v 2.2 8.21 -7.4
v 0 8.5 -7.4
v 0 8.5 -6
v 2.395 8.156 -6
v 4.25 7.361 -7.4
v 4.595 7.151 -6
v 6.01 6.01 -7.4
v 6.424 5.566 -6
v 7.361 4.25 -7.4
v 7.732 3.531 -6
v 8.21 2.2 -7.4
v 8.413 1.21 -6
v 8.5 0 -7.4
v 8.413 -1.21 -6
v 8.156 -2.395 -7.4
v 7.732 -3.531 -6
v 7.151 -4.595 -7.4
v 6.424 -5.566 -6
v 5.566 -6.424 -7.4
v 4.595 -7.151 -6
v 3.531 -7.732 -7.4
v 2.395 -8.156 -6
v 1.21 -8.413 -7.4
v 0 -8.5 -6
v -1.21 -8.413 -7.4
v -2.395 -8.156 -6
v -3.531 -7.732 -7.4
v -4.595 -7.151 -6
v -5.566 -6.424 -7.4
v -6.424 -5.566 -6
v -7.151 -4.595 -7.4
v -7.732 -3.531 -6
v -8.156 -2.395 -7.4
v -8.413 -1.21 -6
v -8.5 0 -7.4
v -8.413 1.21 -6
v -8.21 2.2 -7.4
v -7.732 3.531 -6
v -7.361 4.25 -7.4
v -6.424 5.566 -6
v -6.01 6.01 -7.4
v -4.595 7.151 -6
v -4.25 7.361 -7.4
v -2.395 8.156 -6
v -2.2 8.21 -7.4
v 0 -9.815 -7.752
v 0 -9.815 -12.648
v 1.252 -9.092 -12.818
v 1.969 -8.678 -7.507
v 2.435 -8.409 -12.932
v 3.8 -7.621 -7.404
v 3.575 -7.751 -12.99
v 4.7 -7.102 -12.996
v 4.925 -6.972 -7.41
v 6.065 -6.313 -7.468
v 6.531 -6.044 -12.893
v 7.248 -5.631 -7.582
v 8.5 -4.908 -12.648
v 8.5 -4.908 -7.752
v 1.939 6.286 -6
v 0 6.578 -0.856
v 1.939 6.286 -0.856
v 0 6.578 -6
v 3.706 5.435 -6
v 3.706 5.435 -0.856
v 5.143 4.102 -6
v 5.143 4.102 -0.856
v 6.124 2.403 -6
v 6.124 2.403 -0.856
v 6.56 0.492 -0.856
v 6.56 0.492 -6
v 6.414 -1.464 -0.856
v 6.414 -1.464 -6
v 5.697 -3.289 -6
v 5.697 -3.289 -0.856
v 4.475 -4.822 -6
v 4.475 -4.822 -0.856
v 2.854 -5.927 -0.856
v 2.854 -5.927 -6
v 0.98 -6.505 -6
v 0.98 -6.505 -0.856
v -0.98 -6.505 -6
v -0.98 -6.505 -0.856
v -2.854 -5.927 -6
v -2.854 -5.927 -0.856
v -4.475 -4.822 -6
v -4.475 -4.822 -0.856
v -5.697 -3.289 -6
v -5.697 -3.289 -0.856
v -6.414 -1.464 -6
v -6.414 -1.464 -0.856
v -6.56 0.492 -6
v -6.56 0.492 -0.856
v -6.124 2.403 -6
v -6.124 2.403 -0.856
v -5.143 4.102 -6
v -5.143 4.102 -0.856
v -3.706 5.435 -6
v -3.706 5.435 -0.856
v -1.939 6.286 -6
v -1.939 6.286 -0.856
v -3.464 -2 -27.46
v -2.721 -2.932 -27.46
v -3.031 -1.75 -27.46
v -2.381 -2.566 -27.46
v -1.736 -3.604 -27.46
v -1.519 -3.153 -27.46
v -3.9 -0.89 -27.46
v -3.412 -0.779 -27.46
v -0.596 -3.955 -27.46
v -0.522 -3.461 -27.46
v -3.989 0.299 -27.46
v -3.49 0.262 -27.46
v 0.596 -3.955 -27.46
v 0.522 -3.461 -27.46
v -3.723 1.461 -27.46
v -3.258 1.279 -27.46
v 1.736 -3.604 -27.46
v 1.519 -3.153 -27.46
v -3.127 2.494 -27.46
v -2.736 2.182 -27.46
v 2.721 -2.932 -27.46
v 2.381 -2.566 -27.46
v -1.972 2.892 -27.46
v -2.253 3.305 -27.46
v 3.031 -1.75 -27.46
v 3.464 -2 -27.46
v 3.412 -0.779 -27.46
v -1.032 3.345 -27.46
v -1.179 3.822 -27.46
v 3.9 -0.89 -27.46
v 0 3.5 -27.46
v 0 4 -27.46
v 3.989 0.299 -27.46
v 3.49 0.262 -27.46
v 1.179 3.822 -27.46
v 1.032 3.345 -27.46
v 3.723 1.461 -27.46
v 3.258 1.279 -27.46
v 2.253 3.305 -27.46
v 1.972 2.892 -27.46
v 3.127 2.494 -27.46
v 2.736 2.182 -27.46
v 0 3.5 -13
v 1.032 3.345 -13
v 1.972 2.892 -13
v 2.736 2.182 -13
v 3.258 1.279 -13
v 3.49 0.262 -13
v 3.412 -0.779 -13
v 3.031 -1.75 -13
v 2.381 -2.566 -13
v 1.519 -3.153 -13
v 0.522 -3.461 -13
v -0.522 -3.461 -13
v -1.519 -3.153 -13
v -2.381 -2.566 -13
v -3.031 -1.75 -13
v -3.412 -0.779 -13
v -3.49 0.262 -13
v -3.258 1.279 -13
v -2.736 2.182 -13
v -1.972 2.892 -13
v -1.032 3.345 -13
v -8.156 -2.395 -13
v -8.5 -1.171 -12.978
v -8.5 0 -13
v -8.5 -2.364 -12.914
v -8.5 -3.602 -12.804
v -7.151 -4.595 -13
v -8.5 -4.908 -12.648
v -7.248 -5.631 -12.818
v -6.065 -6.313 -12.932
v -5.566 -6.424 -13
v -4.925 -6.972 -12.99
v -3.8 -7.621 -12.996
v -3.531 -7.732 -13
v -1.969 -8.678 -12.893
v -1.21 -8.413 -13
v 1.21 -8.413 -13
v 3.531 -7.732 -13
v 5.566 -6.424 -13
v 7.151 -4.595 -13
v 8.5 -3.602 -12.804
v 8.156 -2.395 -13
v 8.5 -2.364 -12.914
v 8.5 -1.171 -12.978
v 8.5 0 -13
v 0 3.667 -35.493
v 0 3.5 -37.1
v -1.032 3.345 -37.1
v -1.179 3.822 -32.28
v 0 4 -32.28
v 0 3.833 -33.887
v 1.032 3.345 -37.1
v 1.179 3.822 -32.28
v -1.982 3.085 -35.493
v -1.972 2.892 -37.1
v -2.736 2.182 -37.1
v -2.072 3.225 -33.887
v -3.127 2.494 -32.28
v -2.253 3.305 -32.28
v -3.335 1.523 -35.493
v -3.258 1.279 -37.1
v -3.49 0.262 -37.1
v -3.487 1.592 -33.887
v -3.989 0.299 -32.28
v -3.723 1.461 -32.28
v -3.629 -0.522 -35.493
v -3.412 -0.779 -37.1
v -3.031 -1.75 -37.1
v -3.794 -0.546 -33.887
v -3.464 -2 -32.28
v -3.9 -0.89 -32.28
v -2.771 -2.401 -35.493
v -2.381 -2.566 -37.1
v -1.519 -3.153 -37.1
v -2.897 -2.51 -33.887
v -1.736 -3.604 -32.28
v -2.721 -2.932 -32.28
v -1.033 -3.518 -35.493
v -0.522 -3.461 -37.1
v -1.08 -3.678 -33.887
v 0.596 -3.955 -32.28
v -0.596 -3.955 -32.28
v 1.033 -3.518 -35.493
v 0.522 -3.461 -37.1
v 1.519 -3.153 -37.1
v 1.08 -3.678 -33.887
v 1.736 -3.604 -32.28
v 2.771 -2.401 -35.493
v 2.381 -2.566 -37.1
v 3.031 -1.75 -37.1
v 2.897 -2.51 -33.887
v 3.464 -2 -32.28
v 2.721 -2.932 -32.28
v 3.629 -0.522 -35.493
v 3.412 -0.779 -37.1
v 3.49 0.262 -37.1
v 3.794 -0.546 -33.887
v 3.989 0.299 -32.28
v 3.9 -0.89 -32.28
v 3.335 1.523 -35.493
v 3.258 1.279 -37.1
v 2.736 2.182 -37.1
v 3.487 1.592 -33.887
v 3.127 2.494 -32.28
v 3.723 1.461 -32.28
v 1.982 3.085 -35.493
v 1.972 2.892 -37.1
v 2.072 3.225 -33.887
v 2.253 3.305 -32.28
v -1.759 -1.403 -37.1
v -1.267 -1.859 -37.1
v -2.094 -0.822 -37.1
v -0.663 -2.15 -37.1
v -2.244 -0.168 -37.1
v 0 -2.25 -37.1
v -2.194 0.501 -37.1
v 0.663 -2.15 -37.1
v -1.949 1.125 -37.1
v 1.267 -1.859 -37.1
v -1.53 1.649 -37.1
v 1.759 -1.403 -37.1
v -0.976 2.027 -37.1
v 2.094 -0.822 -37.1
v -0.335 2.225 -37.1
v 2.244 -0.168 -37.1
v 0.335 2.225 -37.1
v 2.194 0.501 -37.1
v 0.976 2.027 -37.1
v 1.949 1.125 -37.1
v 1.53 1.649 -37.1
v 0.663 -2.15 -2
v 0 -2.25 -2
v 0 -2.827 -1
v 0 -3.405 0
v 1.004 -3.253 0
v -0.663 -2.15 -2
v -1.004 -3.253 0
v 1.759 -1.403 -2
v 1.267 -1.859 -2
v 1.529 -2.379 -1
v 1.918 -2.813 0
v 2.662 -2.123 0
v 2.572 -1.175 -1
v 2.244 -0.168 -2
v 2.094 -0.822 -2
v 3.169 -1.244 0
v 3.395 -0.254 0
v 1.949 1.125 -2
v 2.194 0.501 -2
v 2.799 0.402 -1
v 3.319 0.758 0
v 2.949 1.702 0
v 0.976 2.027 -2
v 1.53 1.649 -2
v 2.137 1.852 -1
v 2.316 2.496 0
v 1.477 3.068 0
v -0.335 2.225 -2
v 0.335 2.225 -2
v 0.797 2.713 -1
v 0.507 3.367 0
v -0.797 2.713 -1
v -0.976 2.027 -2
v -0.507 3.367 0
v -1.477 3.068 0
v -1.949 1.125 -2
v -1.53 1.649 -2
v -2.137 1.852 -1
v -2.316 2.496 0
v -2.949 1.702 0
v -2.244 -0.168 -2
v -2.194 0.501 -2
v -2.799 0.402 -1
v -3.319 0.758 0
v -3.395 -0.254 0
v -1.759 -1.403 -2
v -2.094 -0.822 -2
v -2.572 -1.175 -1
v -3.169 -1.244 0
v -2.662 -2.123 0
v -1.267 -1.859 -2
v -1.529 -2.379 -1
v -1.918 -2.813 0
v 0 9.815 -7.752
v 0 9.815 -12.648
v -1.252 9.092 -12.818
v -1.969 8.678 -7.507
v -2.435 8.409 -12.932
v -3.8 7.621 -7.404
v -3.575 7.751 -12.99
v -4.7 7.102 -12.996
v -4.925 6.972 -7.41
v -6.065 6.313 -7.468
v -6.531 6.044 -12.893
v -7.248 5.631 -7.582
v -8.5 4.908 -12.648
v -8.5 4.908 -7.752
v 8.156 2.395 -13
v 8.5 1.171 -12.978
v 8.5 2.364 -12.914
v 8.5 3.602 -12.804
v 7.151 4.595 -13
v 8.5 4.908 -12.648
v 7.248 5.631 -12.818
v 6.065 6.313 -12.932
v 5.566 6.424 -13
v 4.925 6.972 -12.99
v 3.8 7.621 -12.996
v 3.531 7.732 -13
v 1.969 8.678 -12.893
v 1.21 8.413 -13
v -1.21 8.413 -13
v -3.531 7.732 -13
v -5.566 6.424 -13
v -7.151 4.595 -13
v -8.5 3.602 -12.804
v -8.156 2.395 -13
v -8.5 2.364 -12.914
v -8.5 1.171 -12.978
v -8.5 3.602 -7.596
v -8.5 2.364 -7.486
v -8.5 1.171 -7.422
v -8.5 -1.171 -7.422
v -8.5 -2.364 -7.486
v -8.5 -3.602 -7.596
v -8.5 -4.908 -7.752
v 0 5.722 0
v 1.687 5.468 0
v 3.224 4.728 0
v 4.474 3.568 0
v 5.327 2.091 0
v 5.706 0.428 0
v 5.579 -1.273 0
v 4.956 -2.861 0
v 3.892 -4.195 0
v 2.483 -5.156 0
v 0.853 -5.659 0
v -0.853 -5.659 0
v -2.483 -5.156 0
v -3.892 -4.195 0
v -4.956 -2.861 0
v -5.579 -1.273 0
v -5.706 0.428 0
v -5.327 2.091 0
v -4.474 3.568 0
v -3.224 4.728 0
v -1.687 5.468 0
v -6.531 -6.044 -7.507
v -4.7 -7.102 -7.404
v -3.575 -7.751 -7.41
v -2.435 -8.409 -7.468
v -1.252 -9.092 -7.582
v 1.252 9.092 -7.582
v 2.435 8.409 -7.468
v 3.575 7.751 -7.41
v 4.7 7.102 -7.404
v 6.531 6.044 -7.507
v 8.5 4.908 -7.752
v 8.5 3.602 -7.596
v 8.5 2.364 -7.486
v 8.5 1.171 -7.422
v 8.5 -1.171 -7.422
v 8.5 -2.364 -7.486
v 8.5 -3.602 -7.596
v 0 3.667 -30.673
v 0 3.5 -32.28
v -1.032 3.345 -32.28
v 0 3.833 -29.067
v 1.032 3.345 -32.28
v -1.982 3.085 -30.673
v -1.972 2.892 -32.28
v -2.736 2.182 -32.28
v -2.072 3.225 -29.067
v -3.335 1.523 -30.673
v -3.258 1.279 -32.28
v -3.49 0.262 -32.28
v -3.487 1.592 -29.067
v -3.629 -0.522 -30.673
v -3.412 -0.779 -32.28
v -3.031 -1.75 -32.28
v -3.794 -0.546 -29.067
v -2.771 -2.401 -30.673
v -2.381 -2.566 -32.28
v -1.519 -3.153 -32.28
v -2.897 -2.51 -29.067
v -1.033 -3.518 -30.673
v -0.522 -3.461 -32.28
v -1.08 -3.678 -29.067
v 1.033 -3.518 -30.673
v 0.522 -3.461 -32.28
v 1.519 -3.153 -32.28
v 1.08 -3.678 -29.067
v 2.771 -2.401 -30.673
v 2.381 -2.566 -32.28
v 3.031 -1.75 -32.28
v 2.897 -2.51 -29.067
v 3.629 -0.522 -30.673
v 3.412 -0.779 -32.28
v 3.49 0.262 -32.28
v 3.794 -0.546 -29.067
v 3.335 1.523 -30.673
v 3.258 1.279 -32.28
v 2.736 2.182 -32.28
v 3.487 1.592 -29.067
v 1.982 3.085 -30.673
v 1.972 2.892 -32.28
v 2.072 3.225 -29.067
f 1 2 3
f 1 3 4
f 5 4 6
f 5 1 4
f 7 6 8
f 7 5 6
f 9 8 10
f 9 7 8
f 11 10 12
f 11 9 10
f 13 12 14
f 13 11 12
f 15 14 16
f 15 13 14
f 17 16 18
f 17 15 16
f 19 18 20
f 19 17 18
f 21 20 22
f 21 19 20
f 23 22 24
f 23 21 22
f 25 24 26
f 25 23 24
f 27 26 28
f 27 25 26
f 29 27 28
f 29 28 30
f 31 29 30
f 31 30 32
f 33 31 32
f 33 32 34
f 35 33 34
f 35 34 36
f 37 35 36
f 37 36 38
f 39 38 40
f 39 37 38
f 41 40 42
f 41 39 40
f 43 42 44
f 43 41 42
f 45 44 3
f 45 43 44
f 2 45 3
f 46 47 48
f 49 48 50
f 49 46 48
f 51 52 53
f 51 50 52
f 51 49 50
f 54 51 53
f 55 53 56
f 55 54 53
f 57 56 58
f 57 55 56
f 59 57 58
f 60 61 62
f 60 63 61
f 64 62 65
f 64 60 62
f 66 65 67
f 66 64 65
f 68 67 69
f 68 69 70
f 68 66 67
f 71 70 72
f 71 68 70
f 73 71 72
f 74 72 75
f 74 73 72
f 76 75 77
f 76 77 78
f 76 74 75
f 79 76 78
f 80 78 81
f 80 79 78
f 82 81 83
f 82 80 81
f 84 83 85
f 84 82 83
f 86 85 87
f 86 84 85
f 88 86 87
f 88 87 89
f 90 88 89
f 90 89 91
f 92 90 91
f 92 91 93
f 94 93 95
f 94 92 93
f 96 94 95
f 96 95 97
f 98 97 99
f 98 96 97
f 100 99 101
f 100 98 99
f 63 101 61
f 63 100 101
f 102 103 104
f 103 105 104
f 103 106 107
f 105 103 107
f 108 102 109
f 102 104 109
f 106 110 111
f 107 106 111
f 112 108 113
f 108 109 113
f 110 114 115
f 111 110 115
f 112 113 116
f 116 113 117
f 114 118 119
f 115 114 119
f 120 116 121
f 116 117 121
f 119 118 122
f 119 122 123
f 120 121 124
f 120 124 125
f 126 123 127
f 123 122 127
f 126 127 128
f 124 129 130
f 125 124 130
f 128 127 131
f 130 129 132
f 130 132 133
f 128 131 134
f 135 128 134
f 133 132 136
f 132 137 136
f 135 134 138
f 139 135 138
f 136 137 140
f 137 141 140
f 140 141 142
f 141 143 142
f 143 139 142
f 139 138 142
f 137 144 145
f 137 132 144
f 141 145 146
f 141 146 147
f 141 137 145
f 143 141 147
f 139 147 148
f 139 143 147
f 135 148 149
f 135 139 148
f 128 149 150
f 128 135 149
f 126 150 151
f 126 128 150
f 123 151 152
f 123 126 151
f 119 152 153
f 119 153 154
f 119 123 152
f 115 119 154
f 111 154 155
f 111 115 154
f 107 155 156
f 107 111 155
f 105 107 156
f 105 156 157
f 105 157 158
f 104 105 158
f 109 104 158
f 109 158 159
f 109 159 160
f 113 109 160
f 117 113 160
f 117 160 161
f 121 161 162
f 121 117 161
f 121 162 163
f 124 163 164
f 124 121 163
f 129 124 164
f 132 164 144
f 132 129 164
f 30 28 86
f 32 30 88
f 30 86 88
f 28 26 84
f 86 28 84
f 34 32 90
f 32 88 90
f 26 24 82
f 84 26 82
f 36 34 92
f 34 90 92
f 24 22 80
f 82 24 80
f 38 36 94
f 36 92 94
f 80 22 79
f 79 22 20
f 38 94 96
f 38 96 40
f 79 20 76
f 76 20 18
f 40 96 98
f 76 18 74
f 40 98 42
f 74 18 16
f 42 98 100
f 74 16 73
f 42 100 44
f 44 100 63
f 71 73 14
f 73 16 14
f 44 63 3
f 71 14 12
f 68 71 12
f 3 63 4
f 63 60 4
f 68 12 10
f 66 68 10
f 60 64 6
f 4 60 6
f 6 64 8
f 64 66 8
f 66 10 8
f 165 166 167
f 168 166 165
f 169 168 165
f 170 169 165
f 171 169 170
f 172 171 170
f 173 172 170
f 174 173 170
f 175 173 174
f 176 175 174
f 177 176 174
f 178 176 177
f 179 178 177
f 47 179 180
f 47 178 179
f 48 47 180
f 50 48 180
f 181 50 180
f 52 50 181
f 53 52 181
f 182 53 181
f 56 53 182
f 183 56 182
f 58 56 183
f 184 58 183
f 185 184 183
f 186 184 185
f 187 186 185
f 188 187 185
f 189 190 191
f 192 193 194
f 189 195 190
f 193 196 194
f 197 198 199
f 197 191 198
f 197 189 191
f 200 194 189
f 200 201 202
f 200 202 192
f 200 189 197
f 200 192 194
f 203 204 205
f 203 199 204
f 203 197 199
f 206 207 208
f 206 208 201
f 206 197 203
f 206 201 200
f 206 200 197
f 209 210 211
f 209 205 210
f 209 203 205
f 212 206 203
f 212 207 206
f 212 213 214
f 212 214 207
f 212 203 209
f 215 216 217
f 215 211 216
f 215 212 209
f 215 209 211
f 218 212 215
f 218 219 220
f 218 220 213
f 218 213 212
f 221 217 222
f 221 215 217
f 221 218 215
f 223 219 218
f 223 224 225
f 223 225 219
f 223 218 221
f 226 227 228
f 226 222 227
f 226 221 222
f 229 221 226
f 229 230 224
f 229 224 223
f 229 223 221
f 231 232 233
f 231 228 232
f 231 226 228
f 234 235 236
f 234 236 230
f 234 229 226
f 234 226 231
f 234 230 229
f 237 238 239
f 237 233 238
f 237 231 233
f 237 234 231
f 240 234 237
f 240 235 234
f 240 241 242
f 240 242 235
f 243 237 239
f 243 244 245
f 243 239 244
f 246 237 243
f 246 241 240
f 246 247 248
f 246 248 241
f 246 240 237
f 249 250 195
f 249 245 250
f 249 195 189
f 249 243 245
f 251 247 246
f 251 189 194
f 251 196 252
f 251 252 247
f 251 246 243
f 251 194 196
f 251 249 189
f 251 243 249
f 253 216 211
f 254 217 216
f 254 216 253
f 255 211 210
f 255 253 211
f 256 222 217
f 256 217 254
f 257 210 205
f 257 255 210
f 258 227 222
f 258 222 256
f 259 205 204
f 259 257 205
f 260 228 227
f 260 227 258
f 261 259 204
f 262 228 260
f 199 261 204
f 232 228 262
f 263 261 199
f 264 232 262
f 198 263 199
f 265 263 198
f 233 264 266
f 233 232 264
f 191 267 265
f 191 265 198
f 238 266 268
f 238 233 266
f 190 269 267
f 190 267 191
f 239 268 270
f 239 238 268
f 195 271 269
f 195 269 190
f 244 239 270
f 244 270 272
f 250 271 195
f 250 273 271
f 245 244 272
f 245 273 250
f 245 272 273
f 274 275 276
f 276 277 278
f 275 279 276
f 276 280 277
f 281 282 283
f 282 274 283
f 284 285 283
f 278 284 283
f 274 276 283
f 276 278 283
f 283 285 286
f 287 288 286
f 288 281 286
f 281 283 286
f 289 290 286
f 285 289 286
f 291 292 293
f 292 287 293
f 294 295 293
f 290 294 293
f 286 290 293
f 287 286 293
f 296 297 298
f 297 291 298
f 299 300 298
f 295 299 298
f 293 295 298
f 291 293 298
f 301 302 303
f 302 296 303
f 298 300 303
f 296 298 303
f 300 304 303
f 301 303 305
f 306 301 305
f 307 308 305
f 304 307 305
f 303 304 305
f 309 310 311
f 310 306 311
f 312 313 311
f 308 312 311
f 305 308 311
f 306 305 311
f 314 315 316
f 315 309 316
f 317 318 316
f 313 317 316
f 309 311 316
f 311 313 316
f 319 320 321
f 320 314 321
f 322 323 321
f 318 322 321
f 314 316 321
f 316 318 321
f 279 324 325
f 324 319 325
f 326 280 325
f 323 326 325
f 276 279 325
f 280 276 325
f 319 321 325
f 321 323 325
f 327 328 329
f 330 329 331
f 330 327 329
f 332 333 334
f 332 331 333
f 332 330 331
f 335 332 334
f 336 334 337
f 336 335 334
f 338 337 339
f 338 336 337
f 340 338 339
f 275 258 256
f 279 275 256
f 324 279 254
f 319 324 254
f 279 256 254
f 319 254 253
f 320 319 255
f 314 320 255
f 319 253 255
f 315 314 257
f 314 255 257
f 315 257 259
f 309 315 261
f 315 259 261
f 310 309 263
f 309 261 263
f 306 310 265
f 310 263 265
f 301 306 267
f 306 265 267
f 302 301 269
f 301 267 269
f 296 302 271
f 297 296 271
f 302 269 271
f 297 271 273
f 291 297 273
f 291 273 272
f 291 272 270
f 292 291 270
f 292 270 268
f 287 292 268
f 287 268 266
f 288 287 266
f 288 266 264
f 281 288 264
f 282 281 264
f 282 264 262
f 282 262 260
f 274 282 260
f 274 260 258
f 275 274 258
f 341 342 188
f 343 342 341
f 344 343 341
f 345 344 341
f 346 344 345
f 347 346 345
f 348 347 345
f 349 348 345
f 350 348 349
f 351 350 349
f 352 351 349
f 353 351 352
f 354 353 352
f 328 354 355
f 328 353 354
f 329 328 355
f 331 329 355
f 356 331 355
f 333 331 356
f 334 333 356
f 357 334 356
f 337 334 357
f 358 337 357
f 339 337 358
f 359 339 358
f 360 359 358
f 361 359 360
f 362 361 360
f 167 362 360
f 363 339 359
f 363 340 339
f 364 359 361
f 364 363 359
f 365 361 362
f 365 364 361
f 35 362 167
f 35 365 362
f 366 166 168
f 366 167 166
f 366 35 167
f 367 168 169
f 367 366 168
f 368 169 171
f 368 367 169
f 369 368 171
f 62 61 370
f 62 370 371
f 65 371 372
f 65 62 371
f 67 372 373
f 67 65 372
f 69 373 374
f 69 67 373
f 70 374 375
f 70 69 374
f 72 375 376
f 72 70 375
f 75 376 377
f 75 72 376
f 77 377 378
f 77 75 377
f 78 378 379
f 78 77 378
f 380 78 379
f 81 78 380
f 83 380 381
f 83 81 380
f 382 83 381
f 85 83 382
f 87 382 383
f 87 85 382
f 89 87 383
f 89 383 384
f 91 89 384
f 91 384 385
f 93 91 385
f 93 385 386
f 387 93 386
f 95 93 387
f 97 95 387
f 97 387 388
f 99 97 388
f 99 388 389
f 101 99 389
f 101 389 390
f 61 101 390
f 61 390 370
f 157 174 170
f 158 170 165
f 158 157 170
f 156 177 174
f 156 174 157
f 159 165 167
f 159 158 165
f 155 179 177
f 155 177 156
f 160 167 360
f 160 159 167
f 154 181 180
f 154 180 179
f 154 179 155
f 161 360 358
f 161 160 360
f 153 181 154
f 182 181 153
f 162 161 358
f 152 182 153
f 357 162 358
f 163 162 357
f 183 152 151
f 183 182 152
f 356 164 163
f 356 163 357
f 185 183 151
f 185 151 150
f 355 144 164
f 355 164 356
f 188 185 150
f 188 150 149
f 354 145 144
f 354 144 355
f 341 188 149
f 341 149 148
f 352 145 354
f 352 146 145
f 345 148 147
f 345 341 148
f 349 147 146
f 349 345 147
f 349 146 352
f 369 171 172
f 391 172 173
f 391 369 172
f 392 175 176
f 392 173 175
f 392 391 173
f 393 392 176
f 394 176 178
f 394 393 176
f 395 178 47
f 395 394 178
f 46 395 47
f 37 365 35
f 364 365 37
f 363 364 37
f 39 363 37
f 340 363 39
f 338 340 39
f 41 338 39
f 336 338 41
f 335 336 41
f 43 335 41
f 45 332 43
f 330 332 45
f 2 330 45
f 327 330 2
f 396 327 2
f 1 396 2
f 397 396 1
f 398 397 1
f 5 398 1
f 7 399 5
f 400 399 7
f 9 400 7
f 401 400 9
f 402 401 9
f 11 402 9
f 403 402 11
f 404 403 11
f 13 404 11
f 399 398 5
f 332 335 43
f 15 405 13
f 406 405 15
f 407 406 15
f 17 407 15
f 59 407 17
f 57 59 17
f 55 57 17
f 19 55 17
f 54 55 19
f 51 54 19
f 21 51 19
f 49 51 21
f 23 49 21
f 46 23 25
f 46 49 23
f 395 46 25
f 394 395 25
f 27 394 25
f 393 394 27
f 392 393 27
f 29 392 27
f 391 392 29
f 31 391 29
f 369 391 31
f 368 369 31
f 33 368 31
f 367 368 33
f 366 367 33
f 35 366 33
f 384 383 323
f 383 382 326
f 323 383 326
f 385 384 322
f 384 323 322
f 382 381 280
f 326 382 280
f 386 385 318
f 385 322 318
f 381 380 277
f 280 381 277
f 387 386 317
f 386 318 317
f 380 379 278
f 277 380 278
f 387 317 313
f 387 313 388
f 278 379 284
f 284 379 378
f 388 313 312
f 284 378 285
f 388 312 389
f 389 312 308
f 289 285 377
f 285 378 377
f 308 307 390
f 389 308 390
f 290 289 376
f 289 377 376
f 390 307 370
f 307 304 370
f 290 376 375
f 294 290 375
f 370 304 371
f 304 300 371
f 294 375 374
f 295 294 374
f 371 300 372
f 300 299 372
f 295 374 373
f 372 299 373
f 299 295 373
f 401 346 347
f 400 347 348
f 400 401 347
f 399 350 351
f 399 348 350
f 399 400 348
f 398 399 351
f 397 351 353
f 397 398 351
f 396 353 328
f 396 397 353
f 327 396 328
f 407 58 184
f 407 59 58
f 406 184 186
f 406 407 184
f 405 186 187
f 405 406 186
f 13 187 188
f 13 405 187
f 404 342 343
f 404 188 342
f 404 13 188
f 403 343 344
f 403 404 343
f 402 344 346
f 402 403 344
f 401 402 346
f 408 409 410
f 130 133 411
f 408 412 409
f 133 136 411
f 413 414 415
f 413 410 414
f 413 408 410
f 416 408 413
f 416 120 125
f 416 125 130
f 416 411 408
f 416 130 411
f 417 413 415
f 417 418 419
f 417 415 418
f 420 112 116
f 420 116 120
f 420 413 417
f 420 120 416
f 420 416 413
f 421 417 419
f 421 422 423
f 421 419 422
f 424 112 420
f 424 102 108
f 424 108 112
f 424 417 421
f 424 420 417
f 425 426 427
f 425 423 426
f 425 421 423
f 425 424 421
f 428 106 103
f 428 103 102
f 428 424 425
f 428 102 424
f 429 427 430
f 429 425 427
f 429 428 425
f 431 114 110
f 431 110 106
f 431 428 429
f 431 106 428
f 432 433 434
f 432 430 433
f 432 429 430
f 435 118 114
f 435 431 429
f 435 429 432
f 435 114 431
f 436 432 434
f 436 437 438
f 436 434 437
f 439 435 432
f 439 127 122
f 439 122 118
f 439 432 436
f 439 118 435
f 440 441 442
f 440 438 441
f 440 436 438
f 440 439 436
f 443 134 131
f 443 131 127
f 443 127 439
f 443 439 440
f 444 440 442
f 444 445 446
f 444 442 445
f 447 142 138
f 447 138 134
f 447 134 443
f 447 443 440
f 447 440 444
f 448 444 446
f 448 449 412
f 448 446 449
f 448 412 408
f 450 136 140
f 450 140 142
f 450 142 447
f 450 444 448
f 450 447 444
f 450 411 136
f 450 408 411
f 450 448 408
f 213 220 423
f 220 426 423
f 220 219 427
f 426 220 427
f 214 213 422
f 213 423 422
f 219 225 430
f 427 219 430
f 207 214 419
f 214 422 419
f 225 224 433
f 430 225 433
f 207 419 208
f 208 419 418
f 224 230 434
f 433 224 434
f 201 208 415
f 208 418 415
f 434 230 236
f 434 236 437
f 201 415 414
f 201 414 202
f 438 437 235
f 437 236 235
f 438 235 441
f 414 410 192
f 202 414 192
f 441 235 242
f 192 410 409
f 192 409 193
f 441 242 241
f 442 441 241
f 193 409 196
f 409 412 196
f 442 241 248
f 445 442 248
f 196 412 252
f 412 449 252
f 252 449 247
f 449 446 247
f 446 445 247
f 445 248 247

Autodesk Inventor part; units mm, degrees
sketch "Skizze_1" plane through (0, 0, 0) normal (1, 0, 0) x (0, 1, 0)
  line L0 (0, -37.1) -> (0, 0)
  line L1 (0, 0) -> (5.7225, 0)
  line L2 (5.7225, 0) -> (6.5785, -0.856)
  line L3 (6.5785, -0.856) -> (6.5785, -6)
  line L4 (6.5785, -6) -> (8.5, -6)
  line L5 (8.5, -6) -> (8.5, -7.4)
  line L6 (8.5, -7.4) -> (10.2, -7.8555)
  line L7 (10.2, -7.8555) -> (10.2, -12.5445)
  line L8 (10.2, -12.5445) -> (8.5, -13)
  line L9 (8.5, -13) -> (3.5, -13)
  line L10 (3.5, -13) -> (3.5, -27.46)
  line L11 (3.5, -27.46) -> (4, -27.46)
  line L12 (4, -27.46) -> (3.5, -32.28)
  line L13 (3.5, -32.28) -> (4, -32.28)
  line L14 (4, -32.28) -> (3.5, -37.1)
  line L15 (3.5, -37.1) -> (0, -37.1)
  line L16 (0, -37.1) -> (0, 0)
revolve "Revolution1" add sketch "Skizze_1" angle 360 about axis through (0, 0, -37.1) along (0, 0, -1)
thread "Thread1" size "G13.157x1.337" designation "G 1/4" class "A" standard "ISO Pipe Threads" length 4.394
sketch "Sketch2" plane through (0, 0, 0) normal (0, 0, 1) x (1, 0, 0)
  point P0 (0, 0)
hole "Hole1" at (0, 0, 0) direction (0, 0, -1) diameter 4.5 depth 37.1 countersink diameter 6.8094 countersink angle 60
sketch "Skizze_3" plane through (0, 0, 0) normal (0, 0, 1) x (1, 0, 0)
  line L0 (-17, -17) -> (17, -17)
  line L1 (17, -17) -> (17, 17)
  line L2 (17, 17) -> (-17, 17)
  line L3 (-17, 17) -> (-17, -17)
  line L4 (-8.5, -4.9075) -> (0, -9.815)
  line L5 (0, -9.815) -> (8.5, -4.9075)
  line L6 (8.5, -4.9075) -> (8.5, 4.9075)
  line L7 (8.5, 4.9075) -> (0, 9.815)
  line L8 (0, 9.815) -> (-8.5, 4.9075)
  line L9 (-8.5, 4.9075) -> (-8.5, -4.9075)
extrude "Extrusion1" cut sketch "Skizze_3" against normal blind 13
ref_plane "ANBAU_STD_XY" through (0, 0, -6) normal (0, 0, -1) x (1, 0, 0)
ref_plane "ANBAU_STD_YZ" through (0, 0, -6) normal (1, 0, 0) x (0, -1, 0)
ref_plane "ANBAU_STD_ZX" through (0, 0, -6) normal (0, -1, 0) x (0, 0, -1)
properties part number "15631 N-1/4-P-6-MS"
